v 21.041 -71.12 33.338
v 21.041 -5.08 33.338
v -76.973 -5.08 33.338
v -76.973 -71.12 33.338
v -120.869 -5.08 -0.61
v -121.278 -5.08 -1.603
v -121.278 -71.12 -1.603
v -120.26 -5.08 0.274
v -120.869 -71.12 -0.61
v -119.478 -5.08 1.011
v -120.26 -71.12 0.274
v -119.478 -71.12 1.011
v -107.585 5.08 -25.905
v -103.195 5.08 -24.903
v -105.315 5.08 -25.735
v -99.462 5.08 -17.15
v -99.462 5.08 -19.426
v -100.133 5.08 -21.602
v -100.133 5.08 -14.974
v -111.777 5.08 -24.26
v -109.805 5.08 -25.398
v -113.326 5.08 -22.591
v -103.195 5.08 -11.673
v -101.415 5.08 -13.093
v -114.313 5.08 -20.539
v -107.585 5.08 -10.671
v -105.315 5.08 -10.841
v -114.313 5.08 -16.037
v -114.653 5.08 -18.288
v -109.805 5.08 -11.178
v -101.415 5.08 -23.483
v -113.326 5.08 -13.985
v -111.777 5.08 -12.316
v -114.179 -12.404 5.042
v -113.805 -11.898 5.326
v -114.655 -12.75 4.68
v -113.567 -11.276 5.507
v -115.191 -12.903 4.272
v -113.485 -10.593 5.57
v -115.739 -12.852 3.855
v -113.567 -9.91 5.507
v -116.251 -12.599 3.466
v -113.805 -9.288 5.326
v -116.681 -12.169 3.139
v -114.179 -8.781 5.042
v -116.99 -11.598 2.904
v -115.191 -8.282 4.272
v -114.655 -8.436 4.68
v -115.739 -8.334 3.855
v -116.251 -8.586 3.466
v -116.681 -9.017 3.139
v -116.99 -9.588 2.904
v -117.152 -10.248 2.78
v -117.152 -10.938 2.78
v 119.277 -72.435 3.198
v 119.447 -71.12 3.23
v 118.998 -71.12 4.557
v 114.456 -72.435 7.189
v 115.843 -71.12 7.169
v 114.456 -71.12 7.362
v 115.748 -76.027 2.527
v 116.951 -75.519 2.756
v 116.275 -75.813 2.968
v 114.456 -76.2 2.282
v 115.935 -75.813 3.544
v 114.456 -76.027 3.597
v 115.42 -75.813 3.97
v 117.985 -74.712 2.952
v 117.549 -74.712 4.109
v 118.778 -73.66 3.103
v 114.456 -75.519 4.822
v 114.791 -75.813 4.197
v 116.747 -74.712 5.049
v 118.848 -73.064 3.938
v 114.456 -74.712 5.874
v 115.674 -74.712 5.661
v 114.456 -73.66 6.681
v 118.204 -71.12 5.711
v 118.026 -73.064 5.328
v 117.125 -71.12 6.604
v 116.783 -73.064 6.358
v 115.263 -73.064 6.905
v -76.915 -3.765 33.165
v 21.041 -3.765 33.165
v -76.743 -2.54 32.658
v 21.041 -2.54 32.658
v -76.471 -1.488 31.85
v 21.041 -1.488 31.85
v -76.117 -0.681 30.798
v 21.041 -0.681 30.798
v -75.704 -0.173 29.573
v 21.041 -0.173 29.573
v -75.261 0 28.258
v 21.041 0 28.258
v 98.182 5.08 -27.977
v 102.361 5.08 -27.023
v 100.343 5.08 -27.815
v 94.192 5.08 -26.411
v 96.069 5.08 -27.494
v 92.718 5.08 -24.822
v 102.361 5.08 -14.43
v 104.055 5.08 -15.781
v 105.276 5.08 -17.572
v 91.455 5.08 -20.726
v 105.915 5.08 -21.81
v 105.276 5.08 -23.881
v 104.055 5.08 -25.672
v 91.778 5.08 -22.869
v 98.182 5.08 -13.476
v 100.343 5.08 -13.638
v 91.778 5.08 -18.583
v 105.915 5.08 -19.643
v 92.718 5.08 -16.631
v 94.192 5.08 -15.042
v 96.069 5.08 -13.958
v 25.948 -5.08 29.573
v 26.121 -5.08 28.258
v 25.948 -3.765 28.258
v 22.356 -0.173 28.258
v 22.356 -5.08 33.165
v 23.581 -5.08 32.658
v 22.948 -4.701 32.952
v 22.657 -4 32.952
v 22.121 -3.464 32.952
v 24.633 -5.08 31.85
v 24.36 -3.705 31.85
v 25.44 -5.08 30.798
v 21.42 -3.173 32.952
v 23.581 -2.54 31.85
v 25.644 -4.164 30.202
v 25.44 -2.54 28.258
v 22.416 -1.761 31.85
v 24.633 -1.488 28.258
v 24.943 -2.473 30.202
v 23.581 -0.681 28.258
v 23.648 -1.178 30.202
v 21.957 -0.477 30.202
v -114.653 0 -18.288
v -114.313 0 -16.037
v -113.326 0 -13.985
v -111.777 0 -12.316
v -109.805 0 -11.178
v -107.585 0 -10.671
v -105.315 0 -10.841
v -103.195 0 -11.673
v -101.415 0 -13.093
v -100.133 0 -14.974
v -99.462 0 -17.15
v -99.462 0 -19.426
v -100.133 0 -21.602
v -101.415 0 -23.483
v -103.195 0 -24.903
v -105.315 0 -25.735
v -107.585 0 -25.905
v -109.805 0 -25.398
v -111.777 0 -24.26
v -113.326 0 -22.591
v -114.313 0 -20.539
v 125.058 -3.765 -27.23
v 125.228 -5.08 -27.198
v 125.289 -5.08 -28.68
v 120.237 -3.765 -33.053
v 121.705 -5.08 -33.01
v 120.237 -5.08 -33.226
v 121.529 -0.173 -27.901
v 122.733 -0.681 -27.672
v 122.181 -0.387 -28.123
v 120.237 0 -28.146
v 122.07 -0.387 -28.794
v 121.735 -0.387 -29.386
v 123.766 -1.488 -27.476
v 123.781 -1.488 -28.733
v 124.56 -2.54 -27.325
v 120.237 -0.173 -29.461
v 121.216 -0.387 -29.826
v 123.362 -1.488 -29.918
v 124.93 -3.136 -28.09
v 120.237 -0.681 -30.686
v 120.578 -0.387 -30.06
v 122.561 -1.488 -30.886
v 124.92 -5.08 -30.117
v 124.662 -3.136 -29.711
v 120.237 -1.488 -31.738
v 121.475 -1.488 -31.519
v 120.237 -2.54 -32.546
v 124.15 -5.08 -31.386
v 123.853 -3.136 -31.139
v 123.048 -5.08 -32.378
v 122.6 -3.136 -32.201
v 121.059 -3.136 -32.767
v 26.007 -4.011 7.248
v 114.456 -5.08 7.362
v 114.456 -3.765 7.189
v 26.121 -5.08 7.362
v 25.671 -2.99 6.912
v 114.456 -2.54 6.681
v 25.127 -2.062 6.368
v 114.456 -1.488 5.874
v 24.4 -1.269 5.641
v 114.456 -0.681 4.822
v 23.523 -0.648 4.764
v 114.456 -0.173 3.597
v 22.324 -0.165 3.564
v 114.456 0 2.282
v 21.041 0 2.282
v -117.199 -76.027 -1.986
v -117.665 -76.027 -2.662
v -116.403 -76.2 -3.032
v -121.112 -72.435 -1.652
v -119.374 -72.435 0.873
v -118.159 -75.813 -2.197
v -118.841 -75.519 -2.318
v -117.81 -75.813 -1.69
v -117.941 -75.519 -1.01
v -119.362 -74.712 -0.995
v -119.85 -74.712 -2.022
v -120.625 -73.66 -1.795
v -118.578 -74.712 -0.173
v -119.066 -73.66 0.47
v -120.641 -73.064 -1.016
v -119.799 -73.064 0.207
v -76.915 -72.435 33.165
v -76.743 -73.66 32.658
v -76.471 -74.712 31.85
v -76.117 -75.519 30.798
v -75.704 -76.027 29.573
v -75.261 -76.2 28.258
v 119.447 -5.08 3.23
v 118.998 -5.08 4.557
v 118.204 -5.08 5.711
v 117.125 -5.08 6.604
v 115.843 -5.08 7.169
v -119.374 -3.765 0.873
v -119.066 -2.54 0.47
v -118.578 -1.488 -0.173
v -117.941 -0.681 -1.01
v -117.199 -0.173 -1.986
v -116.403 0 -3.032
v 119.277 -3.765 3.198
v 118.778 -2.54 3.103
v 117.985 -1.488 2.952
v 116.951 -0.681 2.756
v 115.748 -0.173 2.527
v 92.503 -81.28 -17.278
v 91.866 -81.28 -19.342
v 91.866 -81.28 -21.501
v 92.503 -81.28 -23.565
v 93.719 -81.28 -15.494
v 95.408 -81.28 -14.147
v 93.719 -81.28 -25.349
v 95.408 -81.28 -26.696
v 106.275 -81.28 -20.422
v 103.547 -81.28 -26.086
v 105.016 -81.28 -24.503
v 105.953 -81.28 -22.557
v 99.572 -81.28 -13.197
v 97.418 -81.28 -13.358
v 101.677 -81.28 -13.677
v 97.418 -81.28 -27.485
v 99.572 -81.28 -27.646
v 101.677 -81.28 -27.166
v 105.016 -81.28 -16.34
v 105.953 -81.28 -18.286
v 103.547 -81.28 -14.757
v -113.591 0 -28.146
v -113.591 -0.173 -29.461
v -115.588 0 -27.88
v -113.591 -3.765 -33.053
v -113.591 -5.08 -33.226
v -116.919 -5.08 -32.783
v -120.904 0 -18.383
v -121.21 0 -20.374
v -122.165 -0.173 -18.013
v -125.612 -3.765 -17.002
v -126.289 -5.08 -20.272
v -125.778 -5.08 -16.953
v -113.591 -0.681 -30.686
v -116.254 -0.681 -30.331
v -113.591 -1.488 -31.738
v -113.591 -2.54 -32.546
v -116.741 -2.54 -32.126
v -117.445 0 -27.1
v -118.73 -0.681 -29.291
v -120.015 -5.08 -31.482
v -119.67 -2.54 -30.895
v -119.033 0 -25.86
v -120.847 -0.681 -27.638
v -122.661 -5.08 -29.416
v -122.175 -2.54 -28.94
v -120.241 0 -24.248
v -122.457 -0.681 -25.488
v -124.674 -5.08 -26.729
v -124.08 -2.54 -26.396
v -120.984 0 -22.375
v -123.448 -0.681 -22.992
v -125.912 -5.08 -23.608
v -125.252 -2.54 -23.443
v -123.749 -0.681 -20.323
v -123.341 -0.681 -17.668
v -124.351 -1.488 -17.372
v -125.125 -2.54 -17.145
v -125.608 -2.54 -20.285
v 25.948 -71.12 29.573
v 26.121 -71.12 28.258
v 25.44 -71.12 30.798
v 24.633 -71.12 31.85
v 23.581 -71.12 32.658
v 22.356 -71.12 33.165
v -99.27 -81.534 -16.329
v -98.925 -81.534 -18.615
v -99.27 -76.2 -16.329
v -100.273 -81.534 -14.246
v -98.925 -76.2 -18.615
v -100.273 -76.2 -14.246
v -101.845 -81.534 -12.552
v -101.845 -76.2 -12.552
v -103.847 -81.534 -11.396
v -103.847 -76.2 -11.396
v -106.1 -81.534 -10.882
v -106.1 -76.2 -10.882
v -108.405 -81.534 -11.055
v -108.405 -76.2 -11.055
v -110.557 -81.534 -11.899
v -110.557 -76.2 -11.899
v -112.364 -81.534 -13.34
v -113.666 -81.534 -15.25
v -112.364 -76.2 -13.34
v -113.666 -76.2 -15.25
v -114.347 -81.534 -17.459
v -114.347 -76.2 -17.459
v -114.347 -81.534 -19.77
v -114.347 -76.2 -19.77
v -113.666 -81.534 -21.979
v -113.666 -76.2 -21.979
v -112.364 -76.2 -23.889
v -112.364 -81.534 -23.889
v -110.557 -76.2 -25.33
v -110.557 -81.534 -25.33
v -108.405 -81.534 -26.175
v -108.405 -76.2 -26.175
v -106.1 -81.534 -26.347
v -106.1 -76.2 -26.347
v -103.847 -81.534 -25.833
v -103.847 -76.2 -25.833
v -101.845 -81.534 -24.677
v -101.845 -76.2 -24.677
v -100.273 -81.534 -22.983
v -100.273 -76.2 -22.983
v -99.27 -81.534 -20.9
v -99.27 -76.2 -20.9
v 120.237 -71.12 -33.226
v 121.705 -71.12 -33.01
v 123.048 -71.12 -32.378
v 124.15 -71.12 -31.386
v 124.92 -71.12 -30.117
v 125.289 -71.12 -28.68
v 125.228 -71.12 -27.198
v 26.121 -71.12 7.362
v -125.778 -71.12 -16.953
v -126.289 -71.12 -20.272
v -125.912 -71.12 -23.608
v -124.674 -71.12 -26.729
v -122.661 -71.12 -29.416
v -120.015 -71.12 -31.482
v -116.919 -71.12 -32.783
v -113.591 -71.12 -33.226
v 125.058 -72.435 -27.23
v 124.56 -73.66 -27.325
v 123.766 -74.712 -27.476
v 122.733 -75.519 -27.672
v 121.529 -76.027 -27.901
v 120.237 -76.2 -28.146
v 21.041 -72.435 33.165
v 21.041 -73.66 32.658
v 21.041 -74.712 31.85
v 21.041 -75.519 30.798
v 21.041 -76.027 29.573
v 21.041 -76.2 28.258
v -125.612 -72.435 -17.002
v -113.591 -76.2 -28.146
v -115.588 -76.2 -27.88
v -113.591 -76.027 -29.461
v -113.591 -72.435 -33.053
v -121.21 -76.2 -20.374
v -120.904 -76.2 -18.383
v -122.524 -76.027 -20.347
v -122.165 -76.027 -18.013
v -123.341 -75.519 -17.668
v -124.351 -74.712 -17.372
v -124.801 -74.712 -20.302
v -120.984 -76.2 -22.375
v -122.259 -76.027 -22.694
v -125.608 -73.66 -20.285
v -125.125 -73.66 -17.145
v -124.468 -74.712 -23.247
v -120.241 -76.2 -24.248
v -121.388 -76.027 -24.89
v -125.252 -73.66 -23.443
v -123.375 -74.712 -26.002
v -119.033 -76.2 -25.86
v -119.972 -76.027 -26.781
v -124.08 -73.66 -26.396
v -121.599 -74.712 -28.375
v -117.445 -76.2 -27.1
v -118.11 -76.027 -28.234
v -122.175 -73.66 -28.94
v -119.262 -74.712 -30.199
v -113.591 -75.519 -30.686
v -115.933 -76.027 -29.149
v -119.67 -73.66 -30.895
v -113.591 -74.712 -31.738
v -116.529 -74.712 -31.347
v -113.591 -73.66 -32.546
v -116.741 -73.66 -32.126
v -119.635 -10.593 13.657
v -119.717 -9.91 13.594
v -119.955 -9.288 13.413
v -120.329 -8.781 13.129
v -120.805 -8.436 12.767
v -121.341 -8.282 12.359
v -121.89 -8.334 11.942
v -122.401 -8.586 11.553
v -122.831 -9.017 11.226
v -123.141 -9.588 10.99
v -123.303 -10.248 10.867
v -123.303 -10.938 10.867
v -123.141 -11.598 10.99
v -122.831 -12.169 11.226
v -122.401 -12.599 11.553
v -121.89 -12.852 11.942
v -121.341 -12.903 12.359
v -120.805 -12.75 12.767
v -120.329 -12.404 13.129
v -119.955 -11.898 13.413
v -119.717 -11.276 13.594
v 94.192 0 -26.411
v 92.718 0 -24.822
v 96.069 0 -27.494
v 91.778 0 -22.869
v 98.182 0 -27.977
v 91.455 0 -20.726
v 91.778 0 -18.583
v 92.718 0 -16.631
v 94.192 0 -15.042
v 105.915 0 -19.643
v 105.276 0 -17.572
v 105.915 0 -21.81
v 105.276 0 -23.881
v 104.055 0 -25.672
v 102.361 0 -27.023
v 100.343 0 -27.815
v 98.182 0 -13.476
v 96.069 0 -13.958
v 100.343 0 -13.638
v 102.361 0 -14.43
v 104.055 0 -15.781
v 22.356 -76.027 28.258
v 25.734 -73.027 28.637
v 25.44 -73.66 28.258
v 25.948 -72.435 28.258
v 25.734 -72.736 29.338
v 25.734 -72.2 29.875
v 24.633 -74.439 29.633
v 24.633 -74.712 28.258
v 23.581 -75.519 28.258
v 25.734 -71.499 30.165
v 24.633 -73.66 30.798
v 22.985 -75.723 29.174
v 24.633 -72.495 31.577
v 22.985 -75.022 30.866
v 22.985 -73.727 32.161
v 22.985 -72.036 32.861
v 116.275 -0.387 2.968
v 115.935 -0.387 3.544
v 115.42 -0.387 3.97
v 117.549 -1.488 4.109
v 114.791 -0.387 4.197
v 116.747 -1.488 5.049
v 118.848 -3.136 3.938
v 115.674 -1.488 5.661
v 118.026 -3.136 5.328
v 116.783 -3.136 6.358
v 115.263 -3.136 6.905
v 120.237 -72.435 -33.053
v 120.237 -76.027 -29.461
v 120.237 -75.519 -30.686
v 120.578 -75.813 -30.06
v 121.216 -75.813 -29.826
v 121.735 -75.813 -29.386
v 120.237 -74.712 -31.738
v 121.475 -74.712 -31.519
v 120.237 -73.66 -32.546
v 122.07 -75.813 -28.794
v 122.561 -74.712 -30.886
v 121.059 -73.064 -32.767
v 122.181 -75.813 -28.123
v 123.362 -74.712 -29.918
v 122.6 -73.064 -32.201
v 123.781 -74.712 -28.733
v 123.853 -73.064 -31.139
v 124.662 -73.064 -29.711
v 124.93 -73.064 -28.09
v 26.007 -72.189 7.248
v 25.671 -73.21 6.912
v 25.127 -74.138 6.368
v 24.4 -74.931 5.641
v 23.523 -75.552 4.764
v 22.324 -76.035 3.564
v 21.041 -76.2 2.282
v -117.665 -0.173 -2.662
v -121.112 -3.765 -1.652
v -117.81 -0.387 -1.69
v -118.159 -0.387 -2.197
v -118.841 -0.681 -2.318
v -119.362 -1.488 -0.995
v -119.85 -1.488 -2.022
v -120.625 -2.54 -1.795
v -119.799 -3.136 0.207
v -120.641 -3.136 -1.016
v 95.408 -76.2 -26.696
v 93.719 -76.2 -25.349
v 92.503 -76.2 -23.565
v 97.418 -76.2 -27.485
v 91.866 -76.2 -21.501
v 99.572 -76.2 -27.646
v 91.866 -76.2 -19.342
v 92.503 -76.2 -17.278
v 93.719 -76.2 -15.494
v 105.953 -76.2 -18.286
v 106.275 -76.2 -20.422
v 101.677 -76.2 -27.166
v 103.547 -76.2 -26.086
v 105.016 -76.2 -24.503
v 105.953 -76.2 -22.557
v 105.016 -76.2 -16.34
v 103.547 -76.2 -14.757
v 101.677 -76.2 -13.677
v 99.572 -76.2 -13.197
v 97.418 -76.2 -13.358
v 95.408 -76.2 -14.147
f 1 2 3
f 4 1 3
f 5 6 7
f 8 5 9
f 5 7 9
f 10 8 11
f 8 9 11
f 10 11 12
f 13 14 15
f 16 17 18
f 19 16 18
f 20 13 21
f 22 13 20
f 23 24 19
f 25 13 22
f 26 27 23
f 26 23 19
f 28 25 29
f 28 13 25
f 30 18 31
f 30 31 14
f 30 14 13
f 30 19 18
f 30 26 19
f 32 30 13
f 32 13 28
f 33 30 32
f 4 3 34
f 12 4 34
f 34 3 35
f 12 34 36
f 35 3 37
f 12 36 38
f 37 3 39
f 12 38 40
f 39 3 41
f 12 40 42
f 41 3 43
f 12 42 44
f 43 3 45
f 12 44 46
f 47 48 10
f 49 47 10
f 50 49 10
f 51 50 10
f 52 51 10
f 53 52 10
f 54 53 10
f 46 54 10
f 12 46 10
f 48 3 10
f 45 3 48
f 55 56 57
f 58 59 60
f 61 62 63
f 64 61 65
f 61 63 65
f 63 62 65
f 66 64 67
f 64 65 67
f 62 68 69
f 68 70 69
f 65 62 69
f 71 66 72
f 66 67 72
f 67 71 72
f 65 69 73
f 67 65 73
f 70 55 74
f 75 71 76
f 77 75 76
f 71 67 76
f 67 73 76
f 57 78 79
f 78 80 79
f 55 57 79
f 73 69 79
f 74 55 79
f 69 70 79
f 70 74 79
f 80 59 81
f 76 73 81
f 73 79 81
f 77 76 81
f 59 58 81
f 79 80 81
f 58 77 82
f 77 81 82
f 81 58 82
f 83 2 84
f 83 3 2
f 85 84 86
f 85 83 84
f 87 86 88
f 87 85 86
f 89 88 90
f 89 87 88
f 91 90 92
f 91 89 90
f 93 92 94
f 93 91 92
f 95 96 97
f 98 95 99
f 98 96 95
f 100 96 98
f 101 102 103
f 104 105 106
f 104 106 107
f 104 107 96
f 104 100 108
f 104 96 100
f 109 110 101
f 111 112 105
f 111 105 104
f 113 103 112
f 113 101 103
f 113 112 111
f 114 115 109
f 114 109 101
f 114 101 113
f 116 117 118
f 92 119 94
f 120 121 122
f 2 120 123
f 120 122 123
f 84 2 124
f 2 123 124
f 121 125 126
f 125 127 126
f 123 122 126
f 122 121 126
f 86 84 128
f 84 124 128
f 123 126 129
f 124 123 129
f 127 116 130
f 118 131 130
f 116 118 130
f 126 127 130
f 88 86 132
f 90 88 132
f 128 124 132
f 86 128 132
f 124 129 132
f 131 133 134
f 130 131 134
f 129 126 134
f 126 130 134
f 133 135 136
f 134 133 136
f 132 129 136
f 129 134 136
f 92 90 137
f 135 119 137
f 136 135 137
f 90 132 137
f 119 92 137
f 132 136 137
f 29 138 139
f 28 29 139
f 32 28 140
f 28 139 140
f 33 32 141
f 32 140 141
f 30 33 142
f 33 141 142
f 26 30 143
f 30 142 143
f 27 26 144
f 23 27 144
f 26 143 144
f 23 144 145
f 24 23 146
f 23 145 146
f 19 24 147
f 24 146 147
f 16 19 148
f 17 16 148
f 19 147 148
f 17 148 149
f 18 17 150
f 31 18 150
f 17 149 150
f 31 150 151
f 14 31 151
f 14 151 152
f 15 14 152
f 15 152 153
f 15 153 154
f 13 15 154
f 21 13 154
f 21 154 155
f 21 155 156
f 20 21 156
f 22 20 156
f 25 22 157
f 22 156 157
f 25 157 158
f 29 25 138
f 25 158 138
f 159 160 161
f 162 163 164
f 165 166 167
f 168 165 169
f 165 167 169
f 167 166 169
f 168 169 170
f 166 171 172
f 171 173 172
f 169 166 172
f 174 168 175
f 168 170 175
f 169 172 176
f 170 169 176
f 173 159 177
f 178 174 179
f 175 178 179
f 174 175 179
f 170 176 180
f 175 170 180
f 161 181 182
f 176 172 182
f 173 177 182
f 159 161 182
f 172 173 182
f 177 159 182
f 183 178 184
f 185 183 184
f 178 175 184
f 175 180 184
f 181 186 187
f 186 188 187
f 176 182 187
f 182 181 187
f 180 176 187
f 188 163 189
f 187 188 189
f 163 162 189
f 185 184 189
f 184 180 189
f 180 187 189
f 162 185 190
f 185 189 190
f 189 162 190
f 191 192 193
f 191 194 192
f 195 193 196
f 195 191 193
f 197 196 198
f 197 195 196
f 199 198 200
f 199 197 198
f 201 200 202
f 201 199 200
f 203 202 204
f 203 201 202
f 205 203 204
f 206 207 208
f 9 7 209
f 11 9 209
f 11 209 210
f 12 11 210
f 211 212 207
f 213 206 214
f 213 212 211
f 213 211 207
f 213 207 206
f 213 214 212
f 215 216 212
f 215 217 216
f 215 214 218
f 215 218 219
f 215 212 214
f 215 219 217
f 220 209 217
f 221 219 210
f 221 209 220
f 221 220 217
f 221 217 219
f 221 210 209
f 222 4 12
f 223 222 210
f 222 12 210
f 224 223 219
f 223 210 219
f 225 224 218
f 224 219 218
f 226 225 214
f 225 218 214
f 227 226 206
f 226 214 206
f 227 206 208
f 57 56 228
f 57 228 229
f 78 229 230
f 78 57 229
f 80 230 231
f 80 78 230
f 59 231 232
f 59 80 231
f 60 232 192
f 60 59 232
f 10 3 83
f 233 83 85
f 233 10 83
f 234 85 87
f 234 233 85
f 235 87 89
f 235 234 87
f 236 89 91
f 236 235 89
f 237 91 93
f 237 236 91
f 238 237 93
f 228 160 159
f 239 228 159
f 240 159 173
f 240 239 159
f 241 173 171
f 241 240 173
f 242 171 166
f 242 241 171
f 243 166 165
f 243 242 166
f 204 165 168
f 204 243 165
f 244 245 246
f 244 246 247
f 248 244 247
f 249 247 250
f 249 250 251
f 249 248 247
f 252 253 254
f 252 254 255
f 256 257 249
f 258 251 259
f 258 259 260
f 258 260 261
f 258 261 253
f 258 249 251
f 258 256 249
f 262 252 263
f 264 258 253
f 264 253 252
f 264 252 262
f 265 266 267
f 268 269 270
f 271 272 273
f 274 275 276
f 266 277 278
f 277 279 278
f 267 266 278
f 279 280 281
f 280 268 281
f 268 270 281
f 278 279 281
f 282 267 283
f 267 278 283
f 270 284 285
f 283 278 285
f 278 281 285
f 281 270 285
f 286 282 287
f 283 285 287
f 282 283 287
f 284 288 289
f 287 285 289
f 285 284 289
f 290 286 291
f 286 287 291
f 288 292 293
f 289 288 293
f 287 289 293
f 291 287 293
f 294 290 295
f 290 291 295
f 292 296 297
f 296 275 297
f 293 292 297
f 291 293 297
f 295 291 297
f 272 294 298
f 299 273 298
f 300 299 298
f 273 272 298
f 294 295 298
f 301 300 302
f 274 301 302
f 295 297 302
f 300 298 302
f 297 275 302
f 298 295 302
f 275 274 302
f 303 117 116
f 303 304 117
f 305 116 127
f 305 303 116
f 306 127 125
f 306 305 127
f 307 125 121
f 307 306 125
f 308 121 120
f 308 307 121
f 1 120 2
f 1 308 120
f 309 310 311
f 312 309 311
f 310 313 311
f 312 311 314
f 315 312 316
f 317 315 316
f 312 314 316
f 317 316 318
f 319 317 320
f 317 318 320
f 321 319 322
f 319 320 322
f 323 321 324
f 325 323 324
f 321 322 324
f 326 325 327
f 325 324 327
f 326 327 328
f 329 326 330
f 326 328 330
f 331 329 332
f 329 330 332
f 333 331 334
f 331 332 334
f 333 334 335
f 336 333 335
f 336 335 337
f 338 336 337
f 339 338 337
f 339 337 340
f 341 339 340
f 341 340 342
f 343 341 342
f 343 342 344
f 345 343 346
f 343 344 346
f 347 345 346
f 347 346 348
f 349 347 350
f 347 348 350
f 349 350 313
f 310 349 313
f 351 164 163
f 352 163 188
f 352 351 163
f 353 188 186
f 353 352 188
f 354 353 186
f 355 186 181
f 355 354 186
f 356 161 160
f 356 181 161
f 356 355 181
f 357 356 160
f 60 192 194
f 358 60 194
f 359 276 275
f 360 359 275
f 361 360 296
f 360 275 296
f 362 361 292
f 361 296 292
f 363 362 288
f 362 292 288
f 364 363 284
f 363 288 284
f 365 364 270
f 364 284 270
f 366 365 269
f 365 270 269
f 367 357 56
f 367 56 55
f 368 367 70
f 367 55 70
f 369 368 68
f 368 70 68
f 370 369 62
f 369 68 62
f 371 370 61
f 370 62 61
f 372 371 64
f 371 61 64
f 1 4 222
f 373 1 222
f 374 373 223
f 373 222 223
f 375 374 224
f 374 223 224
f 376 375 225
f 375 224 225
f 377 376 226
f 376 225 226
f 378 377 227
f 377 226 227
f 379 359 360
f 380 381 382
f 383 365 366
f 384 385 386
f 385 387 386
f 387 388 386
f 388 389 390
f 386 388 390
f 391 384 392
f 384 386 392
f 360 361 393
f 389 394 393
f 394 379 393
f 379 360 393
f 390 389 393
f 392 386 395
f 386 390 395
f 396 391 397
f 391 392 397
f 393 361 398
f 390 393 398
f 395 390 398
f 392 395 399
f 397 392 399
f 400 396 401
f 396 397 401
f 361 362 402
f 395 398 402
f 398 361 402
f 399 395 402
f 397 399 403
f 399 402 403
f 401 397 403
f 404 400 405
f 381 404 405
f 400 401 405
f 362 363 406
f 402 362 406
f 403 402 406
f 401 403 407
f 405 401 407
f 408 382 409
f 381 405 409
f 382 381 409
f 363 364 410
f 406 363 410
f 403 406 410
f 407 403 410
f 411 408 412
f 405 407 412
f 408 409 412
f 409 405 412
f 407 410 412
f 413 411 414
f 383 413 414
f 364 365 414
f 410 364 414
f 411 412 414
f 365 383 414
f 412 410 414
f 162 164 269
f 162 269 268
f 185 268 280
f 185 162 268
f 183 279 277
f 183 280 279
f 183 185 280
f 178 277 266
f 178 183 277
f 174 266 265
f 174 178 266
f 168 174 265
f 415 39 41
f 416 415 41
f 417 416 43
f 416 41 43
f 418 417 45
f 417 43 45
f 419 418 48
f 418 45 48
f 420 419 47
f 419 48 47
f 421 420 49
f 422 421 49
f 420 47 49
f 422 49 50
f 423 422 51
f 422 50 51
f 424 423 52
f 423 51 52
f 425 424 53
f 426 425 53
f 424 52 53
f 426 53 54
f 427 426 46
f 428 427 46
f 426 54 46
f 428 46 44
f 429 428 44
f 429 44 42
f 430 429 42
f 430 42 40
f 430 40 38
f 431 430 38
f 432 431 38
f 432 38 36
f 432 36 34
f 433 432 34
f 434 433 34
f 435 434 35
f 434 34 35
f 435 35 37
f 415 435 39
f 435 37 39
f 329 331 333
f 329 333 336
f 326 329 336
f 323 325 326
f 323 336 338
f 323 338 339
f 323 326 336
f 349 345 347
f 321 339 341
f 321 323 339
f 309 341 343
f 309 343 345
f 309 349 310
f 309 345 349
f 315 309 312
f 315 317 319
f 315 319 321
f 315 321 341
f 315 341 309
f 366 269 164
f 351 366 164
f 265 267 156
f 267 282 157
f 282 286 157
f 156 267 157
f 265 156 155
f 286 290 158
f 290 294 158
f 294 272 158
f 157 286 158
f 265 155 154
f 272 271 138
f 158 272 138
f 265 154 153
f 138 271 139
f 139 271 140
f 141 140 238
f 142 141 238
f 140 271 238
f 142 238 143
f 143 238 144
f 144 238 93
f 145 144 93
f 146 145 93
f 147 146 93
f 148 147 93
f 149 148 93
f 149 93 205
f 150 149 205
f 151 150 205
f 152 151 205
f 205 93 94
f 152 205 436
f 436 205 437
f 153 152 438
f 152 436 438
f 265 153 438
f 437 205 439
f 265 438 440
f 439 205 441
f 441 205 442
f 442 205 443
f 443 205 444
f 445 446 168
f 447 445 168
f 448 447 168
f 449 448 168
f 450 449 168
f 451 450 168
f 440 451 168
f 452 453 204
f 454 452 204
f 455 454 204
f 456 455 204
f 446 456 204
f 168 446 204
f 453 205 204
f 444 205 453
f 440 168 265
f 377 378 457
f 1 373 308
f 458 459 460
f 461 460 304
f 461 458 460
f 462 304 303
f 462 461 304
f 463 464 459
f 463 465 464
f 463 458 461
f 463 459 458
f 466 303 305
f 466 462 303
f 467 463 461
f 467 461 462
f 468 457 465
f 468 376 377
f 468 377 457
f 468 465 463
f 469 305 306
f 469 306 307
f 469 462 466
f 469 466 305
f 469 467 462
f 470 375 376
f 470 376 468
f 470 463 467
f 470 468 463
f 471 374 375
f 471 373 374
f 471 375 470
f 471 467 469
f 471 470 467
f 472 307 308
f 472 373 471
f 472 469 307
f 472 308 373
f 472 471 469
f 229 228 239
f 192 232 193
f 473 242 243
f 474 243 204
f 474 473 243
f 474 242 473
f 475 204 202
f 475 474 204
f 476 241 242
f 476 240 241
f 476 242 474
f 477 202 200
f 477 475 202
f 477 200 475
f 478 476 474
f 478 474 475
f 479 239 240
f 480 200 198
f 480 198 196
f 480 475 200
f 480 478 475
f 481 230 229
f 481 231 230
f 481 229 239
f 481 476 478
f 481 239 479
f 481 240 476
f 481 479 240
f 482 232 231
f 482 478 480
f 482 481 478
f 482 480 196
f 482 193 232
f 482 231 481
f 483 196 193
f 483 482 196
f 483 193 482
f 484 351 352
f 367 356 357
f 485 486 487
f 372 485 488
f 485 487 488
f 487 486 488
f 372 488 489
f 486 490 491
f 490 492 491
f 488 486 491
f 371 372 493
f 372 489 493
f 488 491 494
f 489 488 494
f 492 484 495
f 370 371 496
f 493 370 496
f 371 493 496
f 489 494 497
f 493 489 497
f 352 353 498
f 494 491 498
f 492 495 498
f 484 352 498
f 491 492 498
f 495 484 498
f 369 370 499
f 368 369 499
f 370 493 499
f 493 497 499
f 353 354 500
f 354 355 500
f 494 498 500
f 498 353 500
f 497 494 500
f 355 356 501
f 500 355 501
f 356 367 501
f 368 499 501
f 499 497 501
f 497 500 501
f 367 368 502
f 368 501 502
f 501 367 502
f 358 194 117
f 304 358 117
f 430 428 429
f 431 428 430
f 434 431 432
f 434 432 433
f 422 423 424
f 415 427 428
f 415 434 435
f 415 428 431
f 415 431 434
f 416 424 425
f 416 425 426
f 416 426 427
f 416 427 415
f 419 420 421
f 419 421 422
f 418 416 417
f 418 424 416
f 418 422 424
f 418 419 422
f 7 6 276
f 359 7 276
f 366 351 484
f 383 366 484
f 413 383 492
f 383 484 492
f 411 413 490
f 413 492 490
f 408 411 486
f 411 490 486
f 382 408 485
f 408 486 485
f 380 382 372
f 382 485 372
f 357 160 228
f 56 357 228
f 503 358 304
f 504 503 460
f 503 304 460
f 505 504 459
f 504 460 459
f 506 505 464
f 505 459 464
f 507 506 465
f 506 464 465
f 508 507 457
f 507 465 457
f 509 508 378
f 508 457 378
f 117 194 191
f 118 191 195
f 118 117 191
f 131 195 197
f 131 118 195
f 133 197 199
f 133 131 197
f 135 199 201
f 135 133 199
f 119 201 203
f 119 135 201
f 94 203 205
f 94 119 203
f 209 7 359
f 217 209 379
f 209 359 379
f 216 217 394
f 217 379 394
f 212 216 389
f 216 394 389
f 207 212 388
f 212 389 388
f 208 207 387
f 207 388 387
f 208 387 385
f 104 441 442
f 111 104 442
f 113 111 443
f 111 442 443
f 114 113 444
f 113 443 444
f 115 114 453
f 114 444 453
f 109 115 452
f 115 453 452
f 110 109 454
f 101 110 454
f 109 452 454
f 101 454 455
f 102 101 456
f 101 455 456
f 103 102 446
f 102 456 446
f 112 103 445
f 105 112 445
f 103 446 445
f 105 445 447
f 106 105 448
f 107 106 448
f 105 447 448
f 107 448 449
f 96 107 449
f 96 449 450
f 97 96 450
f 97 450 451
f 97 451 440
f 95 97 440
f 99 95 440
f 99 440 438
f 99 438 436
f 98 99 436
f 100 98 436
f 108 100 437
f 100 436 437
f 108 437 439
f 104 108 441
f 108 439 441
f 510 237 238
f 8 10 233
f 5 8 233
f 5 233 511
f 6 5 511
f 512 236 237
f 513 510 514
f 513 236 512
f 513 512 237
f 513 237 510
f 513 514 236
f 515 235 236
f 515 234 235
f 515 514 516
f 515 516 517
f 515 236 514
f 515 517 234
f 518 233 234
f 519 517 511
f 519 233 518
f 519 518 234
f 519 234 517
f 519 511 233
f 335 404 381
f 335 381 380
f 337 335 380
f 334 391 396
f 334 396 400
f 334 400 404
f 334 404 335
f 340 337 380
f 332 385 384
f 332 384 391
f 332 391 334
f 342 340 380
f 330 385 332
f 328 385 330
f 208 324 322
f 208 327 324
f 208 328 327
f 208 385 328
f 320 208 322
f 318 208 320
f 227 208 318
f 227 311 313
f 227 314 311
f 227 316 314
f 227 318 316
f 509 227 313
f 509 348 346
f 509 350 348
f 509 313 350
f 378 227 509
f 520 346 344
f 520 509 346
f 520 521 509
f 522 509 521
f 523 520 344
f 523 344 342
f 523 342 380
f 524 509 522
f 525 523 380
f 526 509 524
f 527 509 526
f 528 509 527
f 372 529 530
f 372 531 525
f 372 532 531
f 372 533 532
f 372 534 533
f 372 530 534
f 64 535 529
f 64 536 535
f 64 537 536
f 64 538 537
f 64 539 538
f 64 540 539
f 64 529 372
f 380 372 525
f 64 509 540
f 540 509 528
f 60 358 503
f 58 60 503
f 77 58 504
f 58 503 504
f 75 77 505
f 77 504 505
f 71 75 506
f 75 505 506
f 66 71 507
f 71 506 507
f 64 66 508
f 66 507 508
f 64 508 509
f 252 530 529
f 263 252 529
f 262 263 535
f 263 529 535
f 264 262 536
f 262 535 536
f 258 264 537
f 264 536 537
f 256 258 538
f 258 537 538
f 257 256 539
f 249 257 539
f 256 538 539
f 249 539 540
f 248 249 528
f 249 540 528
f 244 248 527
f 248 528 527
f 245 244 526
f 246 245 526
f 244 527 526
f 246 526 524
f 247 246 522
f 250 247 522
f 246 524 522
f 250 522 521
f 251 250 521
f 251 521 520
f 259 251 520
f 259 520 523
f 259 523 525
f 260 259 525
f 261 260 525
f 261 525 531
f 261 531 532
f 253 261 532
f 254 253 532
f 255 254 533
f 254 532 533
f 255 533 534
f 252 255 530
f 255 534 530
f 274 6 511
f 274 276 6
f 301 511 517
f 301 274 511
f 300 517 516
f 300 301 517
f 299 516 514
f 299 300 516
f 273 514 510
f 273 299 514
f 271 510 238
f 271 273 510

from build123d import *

# Parameters (mm, degrees)
F1_DEPTH    = 76.2
F2_R        = 5.08
F3_T1_DEPTH = 76.2
F3_T4_ANGLE = 106.3398594687
F3_T6_ANGLE = 106.3398594687
F4_R        = 7.7543468395
F5_DEPTH    = 0.254
F6_DEPTH    = 5.08
F7_R        = 7.6382634684
F8_DEPTH    = 5.08
F10_R       = 7.2706121331
F11_DEPTH   = 5.08
F9_R        = 7.2450103535
F12_DEPTH   = 5.08
F13_R       = 2.3168995741
F14_DEPTH   = 10.16


# Not quite as in the source:
# - a fillet or chamfer that OpenCascade refuses, or shapes differently, is made with other operations: its cross-section is extruded or revolved along the edge and cut away or added
# - the program builds the solid bodies; features that only make, move or delete a surface that nothing else refers to are left out


with BuildPart() as f1:
    # F0 (on Front) → F1 (new body)
    with BuildSketch(Plane.XZ):
        Polygon((-120.808057487, 0), (-130.5492073298, -33.2263112068), (126.3735592365, -33.2263112068), (118.6618208885, 7.3618022725), (26.1209160089, 7.3618022725), (26.1209160089, 33.3381965756), (-76.9728943706, 33.3381965756), align=None)
    extrude(amount=F1_DEPTH)

    # F2
    f2_edges = [f1.edges().sort_by_distance(p)[0] for p in [
        (-125.678632, -76.2, -16.613156),
        (-98.890476, -76.2, 16.669098),
        (-25.425989, -76.2, 33.338197),
        (26.120916, -76.2, 20.349999),
        (26.120916, 0, 20.349999),
        (26.120916, -38.1, 33.338197),
        (-98.890476, 0, 16.669098),
        (-25.425989, 0, 33.338197),
        (-125.678632, 0, -16.613156),
        (-2.087824, 0, -33.226311),
        (-120.808057, -38.1, 0),
        (-2.087824, -76.2, -33.226311),
        (72.391368, -76.2, 7.361802),
        (118.661821, -38.1, 7.361802),
        (122.51769, -76.2, -12.932254),
        (126.373559, -38.1, -33.226311),
        (122.51769, 0, -12.932254),
        (72.391368, 0, 7.361802),
    ]]
    fillet(f2_edges, radius=F2_R)

    # F3: fillet of radius 12.7 on 1 edges, made by hand

    # F3_s2 → F3_t1 (cut)
    with BuildSketch(Plane.XZ):
        with BuildLine():
            ThreePointArc((-125.7783735266, -16.9533648691), (-123.756623344, -28.1392469582), (-113.5913289929, -33.2263112068))
            Line((-113.5913289929, -33.2263112068), (-130.5492073298, -33.2263112068))
            Line((-130.5492073298, -33.2263112068), (-125.7783735266, -16.9533648691))
        make_face()
    extrude(amount=F3_T1_DEPTH, mode=Mode.SUBTRACT)

    # F3_s3 → F3_t4 (revolve, cut)
    with BuildSketch(Plane.YZ.offset(-113.5913289929)):
        with BuildLine():
            ThreePointArc((0, -28.1463112068), (-1.4878975516, -31.7384136552), (-5.08, -33.2263112068))
            Line((-5.08, -33.2263112068), (0, -33.2263112068))
            Line((0, -33.2263112068), (0, -28.1463112068))
        make_face()
    revolve(axis=Axis((-113.5913289929, 0, -20.5263112068), (0, 1, 0)), revolution_arc=F3_T4_ANGLE, mode=Mode.SUBTRACT)

    # F3_s5 → F3_t6 (revolve, cut)
    with BuildSketch(Plane(origin=(-14.5321554702, 0, -49.5680620824), x_dir=(0, 1, 0), z_dir=(0.2813343573, 0, 0.9596098058))):
        with BuildLine():
            ThreePointArc((-76.2, 110.848596585), (-74.7121024484, 114.4406990334), (-71.12, 115.928596585))
            Line((-71.12, 115.928596585), (-76.2, 115.928596585))
            Line((-76.2, 115.928596585), (-76.2, 110.848596585))
        make_face()
    revolve(axis=Axis((-113.5913289929, -76.2, -20.5263112068), (0, -1, 0)), revolution_arc=F3_T6_ANGLE, mode=Mode.SUBTRACT)

    # F4 (on face) → F5 (join)
    with BuildSketch(Plane.XZ.offset(76.2)):
        with Locations((-106.6796183586, -18.6145938933)):
            Circle(F4_R)
    extrude(amount=F5_DEPTH)

    # F6 (add): a face of the model
    f6_faces = [f1.faces().sort_by_distance(p)[0] for p in [
        (-106.6796183586, -76.454, -18.6145938933),
    ]]
    extrude(f6_faces, amount=F6_DEPTH)

    # F7 (on face) → F8 (join)
    with BuildSketch(Plane(origin=(0, 0, 0), x_dir=(-1, 0, 0), z_dir=(0, 1, 0))):
        with Locations((107.014529407, -18.2879995555)):
            Circle(F7_R)
    extrude(amount=F8_DEPTH)

    # F10 (on face) → F11 (join)
    with BuildSketch(Plane(origin=(0, 0, 0), x_dir=(-1, 0, 0), z_dir=(0, 1, 0))):
        with Locations((-98.7254753709, -20.7264013588)):
            Circle(F10_R)
    extrude(amount=F11_DEPTH)

    # F9 (on face) → F12 (join)
    with BuildSketch(Plane.XZ.offset(76.2)):
        with Locations((99.0302711725, -20.4215999693)):
            Circle(F9_R)
    extrude(amount=F12_DEPTH)

    # F13 (on face) → F14 (join)
    with BuildSketch(Plane(origin=(-44.2704434122, 0, 58.2095706289), x_dir=(0.7959568218, 0, 0.6053533991), z_dir=(-0.6053533991, 0, 0.7959568218))):
        with Locations((-89.274123311, -10.5928946286)):
            Circle(F13_R)
    extrude(amount=F14_DEPTH)


solid = f1.part
